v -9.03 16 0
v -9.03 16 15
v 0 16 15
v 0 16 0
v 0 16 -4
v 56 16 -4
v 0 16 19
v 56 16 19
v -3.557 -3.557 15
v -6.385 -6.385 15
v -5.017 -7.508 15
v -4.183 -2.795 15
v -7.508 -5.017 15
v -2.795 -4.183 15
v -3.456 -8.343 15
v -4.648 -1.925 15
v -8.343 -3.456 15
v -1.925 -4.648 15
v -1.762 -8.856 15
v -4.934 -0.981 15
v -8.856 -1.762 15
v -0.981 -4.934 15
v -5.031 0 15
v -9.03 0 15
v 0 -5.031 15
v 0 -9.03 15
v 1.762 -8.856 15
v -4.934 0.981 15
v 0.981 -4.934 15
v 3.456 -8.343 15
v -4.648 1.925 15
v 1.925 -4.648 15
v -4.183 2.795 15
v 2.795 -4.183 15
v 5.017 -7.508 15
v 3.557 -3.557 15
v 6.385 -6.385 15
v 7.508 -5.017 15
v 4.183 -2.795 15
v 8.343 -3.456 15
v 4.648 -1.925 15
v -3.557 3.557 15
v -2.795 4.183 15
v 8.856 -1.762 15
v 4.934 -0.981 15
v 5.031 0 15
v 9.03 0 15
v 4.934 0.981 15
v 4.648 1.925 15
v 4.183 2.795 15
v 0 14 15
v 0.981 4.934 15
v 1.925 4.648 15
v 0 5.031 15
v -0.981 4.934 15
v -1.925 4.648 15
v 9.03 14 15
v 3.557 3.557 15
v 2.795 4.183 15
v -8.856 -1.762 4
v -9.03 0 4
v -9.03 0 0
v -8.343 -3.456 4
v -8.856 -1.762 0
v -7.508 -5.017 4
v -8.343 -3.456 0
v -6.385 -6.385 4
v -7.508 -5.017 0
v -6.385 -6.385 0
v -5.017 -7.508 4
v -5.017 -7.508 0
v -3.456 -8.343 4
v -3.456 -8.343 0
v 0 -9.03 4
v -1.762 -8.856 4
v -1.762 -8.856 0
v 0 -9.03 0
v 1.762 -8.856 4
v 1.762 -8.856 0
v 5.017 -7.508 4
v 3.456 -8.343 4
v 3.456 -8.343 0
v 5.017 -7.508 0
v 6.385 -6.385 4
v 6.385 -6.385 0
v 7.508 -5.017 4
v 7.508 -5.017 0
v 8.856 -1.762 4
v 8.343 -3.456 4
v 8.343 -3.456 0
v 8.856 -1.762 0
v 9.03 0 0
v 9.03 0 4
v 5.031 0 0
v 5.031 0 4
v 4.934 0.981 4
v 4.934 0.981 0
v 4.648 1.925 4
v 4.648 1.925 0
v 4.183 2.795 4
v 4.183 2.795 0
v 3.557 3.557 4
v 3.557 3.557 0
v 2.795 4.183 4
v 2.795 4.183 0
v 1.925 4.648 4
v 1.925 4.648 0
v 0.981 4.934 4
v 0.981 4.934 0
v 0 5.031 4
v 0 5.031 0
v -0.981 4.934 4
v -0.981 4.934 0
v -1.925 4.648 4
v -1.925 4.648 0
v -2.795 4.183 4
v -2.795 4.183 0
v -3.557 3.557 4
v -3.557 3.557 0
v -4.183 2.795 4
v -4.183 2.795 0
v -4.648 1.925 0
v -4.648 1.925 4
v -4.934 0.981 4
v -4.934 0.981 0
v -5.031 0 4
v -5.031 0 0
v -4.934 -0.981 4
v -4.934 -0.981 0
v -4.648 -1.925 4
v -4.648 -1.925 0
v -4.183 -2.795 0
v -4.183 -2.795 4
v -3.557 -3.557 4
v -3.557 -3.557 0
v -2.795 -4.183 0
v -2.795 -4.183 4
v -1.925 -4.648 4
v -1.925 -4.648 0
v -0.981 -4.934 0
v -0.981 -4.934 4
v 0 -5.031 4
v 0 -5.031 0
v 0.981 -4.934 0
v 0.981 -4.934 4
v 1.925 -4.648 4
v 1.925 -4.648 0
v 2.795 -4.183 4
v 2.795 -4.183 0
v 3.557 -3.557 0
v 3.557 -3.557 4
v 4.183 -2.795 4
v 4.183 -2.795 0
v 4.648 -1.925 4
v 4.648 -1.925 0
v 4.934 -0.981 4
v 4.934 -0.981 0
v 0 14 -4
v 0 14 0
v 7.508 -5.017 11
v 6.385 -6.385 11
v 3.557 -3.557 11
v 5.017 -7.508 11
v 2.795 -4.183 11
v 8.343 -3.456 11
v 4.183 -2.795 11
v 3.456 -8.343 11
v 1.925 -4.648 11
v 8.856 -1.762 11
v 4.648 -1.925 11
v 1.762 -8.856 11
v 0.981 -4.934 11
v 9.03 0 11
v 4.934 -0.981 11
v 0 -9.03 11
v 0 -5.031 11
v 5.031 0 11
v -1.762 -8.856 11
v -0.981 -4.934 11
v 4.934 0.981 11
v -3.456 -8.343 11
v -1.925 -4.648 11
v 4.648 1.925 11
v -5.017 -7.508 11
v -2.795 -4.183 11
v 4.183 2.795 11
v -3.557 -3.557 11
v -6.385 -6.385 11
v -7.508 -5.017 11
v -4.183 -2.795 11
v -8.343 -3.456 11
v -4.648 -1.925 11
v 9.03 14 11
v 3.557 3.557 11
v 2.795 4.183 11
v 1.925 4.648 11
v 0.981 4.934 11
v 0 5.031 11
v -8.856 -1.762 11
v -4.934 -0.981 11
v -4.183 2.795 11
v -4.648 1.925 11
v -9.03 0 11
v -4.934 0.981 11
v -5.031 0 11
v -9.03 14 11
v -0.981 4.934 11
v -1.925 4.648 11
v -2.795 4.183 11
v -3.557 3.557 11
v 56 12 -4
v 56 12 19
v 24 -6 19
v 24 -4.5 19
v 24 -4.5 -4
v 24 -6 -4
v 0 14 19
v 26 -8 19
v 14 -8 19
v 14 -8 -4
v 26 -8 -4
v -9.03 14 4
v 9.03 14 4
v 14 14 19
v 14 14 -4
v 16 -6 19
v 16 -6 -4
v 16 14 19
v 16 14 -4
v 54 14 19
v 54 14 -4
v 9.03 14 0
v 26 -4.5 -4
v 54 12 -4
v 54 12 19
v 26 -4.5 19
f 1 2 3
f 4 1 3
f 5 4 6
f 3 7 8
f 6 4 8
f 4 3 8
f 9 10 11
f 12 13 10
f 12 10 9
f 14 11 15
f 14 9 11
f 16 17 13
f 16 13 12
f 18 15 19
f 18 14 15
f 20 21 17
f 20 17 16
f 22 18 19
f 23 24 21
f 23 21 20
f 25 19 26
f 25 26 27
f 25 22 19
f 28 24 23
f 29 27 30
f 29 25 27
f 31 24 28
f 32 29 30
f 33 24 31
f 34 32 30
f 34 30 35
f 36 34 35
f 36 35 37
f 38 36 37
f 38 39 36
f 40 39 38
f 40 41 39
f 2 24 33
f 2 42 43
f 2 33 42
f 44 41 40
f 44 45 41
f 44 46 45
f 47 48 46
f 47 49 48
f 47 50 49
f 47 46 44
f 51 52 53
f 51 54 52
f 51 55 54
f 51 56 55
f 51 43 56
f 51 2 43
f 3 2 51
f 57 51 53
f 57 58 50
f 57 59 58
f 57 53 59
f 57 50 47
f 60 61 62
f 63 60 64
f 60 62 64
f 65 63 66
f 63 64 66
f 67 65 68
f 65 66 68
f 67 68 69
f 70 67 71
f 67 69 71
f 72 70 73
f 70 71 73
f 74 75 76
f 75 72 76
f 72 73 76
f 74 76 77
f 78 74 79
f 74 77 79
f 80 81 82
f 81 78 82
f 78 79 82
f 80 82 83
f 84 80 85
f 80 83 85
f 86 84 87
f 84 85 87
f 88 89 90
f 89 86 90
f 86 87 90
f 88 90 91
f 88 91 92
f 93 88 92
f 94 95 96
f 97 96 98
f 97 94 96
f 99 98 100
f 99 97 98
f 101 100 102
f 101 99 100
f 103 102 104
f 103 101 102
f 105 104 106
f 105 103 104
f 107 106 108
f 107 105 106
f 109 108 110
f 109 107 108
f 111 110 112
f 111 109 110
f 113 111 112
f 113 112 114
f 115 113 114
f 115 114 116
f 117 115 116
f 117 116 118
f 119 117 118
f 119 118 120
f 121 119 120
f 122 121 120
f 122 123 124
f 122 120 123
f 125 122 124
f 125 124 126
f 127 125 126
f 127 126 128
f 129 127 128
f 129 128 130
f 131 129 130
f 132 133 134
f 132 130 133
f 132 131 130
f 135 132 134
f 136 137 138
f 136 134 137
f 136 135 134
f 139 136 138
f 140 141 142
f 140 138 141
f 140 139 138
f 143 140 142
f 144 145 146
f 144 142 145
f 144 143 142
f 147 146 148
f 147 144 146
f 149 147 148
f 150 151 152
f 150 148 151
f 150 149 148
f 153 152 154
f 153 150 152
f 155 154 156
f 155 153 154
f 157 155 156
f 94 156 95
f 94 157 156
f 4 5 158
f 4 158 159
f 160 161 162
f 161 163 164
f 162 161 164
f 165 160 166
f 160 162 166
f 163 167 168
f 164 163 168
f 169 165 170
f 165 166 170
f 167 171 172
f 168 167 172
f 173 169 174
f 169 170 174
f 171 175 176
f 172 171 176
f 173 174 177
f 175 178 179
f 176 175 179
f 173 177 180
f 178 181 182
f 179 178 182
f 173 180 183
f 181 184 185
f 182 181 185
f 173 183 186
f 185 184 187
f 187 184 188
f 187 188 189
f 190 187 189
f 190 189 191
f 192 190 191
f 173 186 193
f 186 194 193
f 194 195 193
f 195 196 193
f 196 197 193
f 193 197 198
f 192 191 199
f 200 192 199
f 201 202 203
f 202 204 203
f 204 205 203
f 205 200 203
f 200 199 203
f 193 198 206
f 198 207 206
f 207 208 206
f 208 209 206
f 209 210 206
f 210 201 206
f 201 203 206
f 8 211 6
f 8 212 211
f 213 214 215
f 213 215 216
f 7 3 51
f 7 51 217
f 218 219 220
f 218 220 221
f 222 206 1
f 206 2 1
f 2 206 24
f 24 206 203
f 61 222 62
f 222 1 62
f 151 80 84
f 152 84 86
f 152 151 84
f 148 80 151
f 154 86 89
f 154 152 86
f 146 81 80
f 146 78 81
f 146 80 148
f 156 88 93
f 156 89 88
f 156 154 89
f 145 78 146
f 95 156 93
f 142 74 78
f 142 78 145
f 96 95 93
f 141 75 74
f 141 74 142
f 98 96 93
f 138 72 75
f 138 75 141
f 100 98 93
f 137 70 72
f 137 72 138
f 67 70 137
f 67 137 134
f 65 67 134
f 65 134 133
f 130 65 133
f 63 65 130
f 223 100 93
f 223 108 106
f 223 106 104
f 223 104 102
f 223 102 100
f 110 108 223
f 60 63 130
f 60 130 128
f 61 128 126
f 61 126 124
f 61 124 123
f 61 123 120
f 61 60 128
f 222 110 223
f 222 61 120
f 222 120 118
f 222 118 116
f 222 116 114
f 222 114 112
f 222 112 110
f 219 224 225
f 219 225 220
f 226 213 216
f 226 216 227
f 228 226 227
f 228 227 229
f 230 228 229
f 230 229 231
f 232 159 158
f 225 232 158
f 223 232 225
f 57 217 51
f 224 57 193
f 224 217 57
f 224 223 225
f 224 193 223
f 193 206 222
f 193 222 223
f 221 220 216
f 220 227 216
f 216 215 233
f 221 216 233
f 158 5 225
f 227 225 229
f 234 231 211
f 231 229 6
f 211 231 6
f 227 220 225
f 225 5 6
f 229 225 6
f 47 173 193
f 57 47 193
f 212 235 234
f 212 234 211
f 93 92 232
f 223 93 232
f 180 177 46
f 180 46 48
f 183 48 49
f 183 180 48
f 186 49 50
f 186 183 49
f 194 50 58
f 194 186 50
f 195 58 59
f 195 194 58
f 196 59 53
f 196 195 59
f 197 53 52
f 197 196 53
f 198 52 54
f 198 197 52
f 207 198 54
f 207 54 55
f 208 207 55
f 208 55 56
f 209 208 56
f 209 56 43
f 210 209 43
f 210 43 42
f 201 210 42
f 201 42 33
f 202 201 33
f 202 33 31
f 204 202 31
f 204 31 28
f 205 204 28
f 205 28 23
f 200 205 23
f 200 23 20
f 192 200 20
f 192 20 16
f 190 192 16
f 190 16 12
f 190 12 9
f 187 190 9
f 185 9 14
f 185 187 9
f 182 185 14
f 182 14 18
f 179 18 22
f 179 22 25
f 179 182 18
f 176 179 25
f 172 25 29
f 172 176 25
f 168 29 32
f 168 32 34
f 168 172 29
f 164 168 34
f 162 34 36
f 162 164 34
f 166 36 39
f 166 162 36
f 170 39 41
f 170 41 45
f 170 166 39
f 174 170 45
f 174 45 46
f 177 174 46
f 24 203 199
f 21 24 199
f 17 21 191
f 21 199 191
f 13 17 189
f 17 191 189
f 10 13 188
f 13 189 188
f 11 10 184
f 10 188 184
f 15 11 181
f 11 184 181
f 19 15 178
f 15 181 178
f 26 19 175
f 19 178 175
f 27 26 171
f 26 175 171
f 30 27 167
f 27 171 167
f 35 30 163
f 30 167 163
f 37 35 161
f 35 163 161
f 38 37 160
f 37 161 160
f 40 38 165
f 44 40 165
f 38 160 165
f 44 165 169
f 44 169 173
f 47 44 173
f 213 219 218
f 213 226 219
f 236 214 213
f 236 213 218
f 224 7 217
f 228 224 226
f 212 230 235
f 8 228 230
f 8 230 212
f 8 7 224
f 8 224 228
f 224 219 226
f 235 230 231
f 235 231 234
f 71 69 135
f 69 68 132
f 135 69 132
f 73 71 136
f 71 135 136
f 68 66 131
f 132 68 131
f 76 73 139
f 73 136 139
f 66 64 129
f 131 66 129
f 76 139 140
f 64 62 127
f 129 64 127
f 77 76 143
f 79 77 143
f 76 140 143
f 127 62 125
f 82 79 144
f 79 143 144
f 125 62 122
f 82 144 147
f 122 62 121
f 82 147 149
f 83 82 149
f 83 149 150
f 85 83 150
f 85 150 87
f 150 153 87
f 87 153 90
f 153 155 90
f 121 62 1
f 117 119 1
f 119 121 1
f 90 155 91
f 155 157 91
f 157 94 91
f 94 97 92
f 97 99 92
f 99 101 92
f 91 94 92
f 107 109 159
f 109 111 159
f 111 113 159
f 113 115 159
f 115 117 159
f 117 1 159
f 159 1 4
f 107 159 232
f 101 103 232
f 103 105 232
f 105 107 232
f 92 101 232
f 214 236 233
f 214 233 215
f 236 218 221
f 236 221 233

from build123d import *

# Parameters (mm, degrees)
SKETCH004_R       = 5.031
PAD005_DEPTH      = 15
SKETCH007_W       = 23.03
SKETCH007_H       = 7
POCKET_DEPTH      = 9.031
POCKET_DEPTH_BACK = 9.031
SKETCH008_W       = 20
SKETCH008_H       = 23
PAD006_DEPTH      = 2
PAD012_DEPTH      = 4
PAD013_DEPTH      = 19


with BuildPart() as part:
    # Sketch004 → Pad005 (new body)
    with BuildSketch(Plane.XY):
        with BuildLine():
            ThreePointArc((-9.03, 0), (0, -9.03), (9.03, 0))
            Line((9.03, 0), (9.03, 16))
            Line((9.03, 16), (-9.03, 16))
            Line((-9.03, 16), (-9.03, 0))
        make_face()
        Circle(SKETCH004_R, mode=Mode.SUBTRACT)
    extrude(amount=PAD005_DEPTH)

    # Sketch007 → Pocket (cut, two sides)
    with BuildSketch(Plane.YZ) as pocket_sk:
        with Locations((2.485, 7.5)):
            Rectangle(SKETCH007_W, SKETCH007_H)
    extrude(amount=-POCKET_DEPTH, mode=Mode.SUBTRACT)
    extrude(pocket_sk.sketch, amount=POCKET_DEPTH_BACK, mode=Mode.SUBTRACT)

    # Sketch008 → Pad006 (join)
    with BuildSketch(Plane.XZ.offset(-16)):
        with Locations((10, 7.5)):
            Rectangle(SKETCH008_W, SKETCH008_H)
    extrude(amount=PAD006_DEPTH)

    # Sketch018 → Pad012 (join)
    with BuildSketch(Plane.XY):
        Polygon((14, 16.280637), (14, -8), (26, -8), (26, -4.5), (24, -4.5), (24, -6), (16, -6), (16, 14), (54, 14), (54, 12), (56, 12), (56, 14), (56, 16), (14, 16), align=None)
    extrude(amount=-PAD012_DEPTH)

    # Sketch018 → Pad013 (join)
    with BuildSketch(Plane.XY):
        Polygon((14, 16.280637), (14, -8), (26, -8), (26, -4.5), (24, -4.5), (24, -6), (16, -6), (16, 14), (54, 14), (54, 12), (56, 12), (56, 14), (56, 16), (14, 16), align=None)
    extrude(amount=PAD013_DEPTH)


solid = part.part
